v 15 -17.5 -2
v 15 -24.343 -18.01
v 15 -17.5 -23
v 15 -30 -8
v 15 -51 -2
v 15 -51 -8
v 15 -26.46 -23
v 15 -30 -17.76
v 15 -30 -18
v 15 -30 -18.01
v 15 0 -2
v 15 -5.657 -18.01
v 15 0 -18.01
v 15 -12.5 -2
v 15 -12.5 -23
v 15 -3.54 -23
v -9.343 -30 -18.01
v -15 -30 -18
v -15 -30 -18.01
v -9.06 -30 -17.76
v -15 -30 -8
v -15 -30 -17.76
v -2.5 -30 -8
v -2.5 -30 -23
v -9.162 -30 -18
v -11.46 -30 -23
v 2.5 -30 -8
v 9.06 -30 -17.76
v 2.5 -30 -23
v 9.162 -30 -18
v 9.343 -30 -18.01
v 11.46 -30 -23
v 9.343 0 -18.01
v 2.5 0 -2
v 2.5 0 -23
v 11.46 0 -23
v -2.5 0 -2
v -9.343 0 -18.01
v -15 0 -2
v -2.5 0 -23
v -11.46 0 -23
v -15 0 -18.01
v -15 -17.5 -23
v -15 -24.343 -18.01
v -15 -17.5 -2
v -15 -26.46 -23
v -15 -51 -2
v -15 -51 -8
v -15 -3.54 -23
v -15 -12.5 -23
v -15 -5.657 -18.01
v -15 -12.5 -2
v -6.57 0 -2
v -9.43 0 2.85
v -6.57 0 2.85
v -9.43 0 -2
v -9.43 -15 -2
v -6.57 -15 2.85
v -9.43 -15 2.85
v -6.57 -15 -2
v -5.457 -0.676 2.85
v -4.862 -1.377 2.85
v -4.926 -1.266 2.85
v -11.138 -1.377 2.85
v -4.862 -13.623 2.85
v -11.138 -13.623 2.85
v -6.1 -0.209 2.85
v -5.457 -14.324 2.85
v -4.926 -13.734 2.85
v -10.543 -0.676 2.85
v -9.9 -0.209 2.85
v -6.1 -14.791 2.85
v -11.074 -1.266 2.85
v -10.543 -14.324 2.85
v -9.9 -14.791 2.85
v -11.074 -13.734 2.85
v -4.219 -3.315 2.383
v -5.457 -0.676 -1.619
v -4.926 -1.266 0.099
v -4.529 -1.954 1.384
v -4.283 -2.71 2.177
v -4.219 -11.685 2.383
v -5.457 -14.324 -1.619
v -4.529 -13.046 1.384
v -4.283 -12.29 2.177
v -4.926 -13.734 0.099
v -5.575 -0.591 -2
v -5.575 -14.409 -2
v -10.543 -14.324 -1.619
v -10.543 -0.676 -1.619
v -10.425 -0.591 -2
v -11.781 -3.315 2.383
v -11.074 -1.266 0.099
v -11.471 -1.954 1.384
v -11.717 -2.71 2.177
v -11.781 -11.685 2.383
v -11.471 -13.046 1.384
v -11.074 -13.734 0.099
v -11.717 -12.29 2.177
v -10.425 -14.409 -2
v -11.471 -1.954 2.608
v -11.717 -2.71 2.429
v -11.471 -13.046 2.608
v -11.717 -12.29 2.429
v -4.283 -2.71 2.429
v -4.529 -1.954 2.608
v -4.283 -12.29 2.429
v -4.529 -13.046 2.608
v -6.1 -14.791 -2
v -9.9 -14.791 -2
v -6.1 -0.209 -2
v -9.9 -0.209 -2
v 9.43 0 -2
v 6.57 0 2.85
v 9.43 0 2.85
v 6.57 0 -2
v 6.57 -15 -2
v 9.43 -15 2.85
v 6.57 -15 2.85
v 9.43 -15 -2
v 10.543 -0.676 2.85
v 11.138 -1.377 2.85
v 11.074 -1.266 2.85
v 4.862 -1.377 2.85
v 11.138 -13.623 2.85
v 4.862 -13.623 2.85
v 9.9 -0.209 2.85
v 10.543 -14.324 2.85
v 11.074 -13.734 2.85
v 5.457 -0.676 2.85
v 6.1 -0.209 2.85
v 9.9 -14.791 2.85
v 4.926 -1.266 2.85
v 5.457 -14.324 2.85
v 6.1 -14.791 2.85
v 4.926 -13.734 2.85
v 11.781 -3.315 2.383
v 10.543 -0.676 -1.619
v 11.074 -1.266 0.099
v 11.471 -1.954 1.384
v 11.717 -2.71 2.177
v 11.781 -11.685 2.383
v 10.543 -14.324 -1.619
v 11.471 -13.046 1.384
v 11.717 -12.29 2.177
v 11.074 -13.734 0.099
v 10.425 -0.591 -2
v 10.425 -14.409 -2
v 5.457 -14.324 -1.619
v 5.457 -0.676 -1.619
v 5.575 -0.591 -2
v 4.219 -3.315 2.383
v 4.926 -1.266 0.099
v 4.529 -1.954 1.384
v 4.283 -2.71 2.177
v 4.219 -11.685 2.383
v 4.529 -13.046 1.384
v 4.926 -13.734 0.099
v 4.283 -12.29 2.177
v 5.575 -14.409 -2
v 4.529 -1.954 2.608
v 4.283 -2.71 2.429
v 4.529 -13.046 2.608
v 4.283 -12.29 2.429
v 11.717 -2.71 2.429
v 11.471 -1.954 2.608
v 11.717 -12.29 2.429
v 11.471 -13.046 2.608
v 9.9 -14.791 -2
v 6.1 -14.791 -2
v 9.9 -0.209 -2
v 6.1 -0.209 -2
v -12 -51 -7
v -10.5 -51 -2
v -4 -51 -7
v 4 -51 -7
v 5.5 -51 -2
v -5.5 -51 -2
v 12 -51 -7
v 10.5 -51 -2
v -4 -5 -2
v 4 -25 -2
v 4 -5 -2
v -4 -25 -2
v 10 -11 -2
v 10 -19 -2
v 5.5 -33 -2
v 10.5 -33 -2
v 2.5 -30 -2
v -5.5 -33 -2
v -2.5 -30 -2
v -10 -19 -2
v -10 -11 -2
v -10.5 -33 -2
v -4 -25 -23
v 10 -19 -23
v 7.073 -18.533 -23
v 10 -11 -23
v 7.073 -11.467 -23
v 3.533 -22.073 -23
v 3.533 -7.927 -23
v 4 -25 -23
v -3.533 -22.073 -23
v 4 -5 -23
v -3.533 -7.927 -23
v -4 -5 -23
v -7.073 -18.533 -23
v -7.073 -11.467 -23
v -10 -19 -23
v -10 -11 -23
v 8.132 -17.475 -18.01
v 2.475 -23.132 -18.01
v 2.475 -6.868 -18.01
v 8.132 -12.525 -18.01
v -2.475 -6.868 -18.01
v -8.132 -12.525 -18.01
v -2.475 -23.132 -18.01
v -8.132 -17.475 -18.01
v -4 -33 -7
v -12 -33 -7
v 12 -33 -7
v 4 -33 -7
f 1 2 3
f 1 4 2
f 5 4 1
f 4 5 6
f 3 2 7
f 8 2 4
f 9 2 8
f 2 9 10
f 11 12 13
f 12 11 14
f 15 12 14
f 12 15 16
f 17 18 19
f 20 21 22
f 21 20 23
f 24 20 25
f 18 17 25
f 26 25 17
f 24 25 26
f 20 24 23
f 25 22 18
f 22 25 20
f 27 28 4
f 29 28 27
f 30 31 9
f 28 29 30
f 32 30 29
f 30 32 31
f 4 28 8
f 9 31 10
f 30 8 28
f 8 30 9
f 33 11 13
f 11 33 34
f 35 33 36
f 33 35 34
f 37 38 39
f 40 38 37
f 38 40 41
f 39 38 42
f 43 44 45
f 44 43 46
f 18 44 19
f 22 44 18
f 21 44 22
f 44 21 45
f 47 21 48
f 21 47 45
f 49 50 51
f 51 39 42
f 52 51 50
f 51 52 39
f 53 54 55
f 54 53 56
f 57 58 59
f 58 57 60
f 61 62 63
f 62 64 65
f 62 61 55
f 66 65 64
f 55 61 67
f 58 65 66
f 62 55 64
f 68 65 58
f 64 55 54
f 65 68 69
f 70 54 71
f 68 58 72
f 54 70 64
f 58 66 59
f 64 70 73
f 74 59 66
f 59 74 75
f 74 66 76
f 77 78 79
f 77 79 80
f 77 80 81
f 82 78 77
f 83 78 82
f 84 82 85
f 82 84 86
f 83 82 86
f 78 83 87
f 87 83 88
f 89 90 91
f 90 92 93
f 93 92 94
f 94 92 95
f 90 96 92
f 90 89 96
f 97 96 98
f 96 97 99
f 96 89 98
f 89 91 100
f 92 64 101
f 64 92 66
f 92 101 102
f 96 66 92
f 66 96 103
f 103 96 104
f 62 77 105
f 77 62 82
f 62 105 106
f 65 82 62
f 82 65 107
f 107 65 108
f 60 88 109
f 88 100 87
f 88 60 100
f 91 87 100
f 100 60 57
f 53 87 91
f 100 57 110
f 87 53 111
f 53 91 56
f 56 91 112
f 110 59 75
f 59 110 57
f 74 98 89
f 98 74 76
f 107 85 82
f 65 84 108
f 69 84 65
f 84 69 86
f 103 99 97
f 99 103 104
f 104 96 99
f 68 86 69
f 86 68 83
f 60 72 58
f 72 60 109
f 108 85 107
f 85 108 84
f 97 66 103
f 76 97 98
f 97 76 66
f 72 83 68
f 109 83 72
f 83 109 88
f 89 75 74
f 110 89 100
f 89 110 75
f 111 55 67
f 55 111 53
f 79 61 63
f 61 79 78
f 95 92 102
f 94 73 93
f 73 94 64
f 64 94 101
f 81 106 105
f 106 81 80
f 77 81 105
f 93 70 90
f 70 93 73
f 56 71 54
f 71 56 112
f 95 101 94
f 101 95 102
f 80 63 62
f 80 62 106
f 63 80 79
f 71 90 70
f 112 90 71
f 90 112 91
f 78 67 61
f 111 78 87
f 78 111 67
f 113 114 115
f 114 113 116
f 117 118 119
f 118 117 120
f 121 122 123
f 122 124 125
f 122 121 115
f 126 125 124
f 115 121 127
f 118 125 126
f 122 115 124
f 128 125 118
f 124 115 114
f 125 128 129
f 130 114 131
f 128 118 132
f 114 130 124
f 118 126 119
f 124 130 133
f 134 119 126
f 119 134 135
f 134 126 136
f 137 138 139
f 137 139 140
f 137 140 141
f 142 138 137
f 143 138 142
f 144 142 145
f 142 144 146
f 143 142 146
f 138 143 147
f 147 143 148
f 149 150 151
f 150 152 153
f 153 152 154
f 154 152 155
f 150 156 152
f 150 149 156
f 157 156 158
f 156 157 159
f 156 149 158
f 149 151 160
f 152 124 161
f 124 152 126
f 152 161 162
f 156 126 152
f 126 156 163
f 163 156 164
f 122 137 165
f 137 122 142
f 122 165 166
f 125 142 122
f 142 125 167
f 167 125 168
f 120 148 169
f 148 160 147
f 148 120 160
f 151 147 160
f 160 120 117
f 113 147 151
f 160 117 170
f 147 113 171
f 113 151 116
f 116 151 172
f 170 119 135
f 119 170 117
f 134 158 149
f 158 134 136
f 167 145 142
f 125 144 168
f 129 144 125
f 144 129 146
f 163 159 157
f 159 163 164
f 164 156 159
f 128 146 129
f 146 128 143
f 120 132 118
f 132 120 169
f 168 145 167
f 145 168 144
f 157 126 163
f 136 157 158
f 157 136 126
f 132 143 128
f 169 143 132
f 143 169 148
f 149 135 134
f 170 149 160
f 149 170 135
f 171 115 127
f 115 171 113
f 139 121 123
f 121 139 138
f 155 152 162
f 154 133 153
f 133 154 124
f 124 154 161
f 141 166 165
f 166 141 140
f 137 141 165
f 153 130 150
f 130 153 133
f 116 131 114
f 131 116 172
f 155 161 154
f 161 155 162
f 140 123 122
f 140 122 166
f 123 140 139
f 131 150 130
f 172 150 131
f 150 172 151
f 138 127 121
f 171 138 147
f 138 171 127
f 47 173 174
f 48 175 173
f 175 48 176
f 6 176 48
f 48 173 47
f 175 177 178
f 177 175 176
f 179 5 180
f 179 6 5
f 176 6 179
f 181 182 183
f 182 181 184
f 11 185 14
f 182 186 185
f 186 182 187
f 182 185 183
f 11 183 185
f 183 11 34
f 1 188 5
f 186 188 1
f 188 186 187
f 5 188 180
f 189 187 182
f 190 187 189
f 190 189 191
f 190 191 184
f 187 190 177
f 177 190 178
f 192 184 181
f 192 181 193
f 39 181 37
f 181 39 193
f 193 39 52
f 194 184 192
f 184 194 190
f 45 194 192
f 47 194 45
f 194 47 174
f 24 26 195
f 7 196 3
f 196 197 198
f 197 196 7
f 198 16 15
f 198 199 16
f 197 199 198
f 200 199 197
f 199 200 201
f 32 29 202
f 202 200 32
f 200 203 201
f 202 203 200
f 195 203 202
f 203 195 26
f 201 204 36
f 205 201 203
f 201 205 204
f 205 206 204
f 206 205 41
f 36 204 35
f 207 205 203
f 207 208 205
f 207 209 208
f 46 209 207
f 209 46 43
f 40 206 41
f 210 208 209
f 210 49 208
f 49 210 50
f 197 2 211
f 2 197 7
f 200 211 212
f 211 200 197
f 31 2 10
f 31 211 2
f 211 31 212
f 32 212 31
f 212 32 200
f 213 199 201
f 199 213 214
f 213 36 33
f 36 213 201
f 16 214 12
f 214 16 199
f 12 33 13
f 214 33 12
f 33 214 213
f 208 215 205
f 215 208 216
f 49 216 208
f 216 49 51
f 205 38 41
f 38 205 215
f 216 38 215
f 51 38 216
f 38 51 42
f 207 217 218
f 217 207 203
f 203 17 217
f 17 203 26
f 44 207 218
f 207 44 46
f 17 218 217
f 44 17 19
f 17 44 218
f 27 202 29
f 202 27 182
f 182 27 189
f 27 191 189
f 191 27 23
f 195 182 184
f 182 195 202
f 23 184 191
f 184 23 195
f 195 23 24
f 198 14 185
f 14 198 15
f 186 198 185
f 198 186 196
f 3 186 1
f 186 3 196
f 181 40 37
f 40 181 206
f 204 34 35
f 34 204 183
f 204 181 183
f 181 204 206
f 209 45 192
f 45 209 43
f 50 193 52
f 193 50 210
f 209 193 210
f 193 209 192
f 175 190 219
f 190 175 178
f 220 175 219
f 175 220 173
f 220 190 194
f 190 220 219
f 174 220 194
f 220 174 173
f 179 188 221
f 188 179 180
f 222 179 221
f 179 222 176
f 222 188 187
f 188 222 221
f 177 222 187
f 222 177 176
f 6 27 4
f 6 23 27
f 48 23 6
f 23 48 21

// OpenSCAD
// file: long_bow_tie.scad
tilt_level = 1.1;

include <include.scad>;
include <globals.scad>;

obj_leg = 12;

max_width=scaled_male_dove_max_width();
min_width=scaled_male_dove_min_width();
depth=scaled_male_dove_depth();
length = 50;

module bow_tie_master(length){
	union(){
		mirror([0,1,0])	dovetail_3d(max_width, min_width, depth, length);
		dovetail_3d(max_width, min_width, depth, length);
	}
}

module long_bow_tie(length) {
    translate([0,0,depth]) intersection(){
        rotate([90,0,0]) bow_tie_master(length);
        rotate([90,0,0]) cylinder(r=5.8, h=200);
    }
}

long_bow_tie(length);
// file: long_tie.scad
length = 50;

include <include.scad>;
include <globals.scad>;

use <long_bow_tie.scad>;

$fn=30;
module end(){
    difference() {
        translate([-4, -5, -0.2]) cube([8, 5, 6]);
        translate([0, 0, -0.5])cylinder(r=3.8, h=7);
    }
}

module tie(length) {
    translate([0,0,scaled_male_dove_depth()]) rotate([0,180,0]) difference(){
        long_bow_tie(length);
        translate([-5,-length-1,scaled_male_dove_depth()]) cube([10,length+2,male_dove_depth]);
    }
}

module long_tie(length=50) {
    difference () {
        tie(length);
        translate([0, -(length -3.5), 0]) end();
        translate([0, -3.5, 0]) rotate([0,0,180]) end();
    }
}

long_tie(length);
// file: globals.scad
/*
Most things in this file is represented as one millimeter, so keep that in mind while changing things.
Some of the setting are not mm but at variables that you can set, such as 2*x=2x and you are setting what x is.
I will try to specify when things are variables and not exact measurements.
*/

// printer slop
slop = 0.15;

obj_leg = 30;
leg_length = 5.5;
small_number = 0.001;
metal_core_rode_global = 5;


///////////////// number of holes /////////////////////
z_hole_number = 8;
other_holes = 8;

///////////////// Pins /////////////////////

//pins that poke out
ball_size = 10;
pin_height = 20;
pin_diameter = 6;


//holes
hole_ball_size = ball_size;
hole_pin_height = pin_height;
hole_pin_diameter = pin_diameter;

///////////////// Z THINGS /////////////////////

berring_slot_width = 7.5;
berring_slot_depth = 6.5;
metal_core_rode = 5;

///////////////// X THINGS /////////////////////

//male dove tails
male_dove_max_width=8;
male_dove_min_width=5;
male_dove_depth=5;
male_dove_height=obj_leg/2;

function scaled_male_dove_max_width() = male_dove_max_width - slop;
function scaled_male_dove_min_width() = male_dove_min_width - slop;
function scaled_male_dove_depth() = male_dove_depth - slop;

//female dove tails, this is found on the y mounts
girl_max_width=11;
girl_min_width=5;
girl_depth=5;
girl_height=obj_leg;


///////////////// Y THINGS /////////////////////
/*
The Y is so normal that all of those global variables at the top should change all of the setting in it, this section is set her incase there are variables set in the future development of this project.
*/

// stepper
motor_side_length = 43.2;
motor_bolt_hole_distance = 31;
motor_center_hole = 23;
motor_shaft_dia = 5;
motor_shaft_hole_dia = 5+2*slop;

// bolts etc.
bolt_hole_dia = 3+2*slop;
bolt_head_hole_dia = 5.8;

m4_bolt_hole_dia = 4+2*slop;
m4_bolt_head_hole_dia = 6.8+2*slop;


m3_nut_side = 5.65;
m4_nut_side = 6.85;

// threaded rod
lifter_rod_diam = 9.86;
hole_threaded_rod = lifter_rod_diam+2*slop;
// main file
include <globals.scad>;
include <include.scad>;
use <long_tie.scad>;

tail_depth = 55;
tail_depth_2 = -10;
thickness = 21;
module y_mount_added(){
	translate([0,-15+6-3.5,51/2]) cube([30,thickness,51], center=true);
    
    translate([-8,-12.5+thickness/2,-55+tail_depth]) rotate([-90,0,0]) long_tie(15);
	translate([8,-12.5+thickness/2,-55+tail_depth]) rotate([-90,0,0]) long_tie(15);
}

module y_mount_taken(){
	translate([0,-thickness/2-12.5,15]) rotate([0,45,0]) tie_end();
    
	rotate([180,0,0]) translate([-8,12.5-thickness/2,-53+tail_depth_2]) male_dovetail(height=30);
	rotate([180,0,0]) translate([8,12.5-thickness/2,-53+tail_depth_2]) male_dovetail(height=30);
    translate([-15,-92,0]) wrap(3);
    
    translate([0,-8-30/2,30+30/2]) cube([40,30,30],center=true);
}

rotate([90,0,0]) difference(){
	translate([0,-thickness/2-12.5,15]) bow_support();
	translate([0,-thickness/2-12.5,25]) cube([50,10,20], center=true);
	translate([0,-thickness/2-12.5,0]) cube([31,10,20], center=true);
}

rotate([90,0,0]) difference(){
	y_mount_added();
	y_mount_taken();
}
